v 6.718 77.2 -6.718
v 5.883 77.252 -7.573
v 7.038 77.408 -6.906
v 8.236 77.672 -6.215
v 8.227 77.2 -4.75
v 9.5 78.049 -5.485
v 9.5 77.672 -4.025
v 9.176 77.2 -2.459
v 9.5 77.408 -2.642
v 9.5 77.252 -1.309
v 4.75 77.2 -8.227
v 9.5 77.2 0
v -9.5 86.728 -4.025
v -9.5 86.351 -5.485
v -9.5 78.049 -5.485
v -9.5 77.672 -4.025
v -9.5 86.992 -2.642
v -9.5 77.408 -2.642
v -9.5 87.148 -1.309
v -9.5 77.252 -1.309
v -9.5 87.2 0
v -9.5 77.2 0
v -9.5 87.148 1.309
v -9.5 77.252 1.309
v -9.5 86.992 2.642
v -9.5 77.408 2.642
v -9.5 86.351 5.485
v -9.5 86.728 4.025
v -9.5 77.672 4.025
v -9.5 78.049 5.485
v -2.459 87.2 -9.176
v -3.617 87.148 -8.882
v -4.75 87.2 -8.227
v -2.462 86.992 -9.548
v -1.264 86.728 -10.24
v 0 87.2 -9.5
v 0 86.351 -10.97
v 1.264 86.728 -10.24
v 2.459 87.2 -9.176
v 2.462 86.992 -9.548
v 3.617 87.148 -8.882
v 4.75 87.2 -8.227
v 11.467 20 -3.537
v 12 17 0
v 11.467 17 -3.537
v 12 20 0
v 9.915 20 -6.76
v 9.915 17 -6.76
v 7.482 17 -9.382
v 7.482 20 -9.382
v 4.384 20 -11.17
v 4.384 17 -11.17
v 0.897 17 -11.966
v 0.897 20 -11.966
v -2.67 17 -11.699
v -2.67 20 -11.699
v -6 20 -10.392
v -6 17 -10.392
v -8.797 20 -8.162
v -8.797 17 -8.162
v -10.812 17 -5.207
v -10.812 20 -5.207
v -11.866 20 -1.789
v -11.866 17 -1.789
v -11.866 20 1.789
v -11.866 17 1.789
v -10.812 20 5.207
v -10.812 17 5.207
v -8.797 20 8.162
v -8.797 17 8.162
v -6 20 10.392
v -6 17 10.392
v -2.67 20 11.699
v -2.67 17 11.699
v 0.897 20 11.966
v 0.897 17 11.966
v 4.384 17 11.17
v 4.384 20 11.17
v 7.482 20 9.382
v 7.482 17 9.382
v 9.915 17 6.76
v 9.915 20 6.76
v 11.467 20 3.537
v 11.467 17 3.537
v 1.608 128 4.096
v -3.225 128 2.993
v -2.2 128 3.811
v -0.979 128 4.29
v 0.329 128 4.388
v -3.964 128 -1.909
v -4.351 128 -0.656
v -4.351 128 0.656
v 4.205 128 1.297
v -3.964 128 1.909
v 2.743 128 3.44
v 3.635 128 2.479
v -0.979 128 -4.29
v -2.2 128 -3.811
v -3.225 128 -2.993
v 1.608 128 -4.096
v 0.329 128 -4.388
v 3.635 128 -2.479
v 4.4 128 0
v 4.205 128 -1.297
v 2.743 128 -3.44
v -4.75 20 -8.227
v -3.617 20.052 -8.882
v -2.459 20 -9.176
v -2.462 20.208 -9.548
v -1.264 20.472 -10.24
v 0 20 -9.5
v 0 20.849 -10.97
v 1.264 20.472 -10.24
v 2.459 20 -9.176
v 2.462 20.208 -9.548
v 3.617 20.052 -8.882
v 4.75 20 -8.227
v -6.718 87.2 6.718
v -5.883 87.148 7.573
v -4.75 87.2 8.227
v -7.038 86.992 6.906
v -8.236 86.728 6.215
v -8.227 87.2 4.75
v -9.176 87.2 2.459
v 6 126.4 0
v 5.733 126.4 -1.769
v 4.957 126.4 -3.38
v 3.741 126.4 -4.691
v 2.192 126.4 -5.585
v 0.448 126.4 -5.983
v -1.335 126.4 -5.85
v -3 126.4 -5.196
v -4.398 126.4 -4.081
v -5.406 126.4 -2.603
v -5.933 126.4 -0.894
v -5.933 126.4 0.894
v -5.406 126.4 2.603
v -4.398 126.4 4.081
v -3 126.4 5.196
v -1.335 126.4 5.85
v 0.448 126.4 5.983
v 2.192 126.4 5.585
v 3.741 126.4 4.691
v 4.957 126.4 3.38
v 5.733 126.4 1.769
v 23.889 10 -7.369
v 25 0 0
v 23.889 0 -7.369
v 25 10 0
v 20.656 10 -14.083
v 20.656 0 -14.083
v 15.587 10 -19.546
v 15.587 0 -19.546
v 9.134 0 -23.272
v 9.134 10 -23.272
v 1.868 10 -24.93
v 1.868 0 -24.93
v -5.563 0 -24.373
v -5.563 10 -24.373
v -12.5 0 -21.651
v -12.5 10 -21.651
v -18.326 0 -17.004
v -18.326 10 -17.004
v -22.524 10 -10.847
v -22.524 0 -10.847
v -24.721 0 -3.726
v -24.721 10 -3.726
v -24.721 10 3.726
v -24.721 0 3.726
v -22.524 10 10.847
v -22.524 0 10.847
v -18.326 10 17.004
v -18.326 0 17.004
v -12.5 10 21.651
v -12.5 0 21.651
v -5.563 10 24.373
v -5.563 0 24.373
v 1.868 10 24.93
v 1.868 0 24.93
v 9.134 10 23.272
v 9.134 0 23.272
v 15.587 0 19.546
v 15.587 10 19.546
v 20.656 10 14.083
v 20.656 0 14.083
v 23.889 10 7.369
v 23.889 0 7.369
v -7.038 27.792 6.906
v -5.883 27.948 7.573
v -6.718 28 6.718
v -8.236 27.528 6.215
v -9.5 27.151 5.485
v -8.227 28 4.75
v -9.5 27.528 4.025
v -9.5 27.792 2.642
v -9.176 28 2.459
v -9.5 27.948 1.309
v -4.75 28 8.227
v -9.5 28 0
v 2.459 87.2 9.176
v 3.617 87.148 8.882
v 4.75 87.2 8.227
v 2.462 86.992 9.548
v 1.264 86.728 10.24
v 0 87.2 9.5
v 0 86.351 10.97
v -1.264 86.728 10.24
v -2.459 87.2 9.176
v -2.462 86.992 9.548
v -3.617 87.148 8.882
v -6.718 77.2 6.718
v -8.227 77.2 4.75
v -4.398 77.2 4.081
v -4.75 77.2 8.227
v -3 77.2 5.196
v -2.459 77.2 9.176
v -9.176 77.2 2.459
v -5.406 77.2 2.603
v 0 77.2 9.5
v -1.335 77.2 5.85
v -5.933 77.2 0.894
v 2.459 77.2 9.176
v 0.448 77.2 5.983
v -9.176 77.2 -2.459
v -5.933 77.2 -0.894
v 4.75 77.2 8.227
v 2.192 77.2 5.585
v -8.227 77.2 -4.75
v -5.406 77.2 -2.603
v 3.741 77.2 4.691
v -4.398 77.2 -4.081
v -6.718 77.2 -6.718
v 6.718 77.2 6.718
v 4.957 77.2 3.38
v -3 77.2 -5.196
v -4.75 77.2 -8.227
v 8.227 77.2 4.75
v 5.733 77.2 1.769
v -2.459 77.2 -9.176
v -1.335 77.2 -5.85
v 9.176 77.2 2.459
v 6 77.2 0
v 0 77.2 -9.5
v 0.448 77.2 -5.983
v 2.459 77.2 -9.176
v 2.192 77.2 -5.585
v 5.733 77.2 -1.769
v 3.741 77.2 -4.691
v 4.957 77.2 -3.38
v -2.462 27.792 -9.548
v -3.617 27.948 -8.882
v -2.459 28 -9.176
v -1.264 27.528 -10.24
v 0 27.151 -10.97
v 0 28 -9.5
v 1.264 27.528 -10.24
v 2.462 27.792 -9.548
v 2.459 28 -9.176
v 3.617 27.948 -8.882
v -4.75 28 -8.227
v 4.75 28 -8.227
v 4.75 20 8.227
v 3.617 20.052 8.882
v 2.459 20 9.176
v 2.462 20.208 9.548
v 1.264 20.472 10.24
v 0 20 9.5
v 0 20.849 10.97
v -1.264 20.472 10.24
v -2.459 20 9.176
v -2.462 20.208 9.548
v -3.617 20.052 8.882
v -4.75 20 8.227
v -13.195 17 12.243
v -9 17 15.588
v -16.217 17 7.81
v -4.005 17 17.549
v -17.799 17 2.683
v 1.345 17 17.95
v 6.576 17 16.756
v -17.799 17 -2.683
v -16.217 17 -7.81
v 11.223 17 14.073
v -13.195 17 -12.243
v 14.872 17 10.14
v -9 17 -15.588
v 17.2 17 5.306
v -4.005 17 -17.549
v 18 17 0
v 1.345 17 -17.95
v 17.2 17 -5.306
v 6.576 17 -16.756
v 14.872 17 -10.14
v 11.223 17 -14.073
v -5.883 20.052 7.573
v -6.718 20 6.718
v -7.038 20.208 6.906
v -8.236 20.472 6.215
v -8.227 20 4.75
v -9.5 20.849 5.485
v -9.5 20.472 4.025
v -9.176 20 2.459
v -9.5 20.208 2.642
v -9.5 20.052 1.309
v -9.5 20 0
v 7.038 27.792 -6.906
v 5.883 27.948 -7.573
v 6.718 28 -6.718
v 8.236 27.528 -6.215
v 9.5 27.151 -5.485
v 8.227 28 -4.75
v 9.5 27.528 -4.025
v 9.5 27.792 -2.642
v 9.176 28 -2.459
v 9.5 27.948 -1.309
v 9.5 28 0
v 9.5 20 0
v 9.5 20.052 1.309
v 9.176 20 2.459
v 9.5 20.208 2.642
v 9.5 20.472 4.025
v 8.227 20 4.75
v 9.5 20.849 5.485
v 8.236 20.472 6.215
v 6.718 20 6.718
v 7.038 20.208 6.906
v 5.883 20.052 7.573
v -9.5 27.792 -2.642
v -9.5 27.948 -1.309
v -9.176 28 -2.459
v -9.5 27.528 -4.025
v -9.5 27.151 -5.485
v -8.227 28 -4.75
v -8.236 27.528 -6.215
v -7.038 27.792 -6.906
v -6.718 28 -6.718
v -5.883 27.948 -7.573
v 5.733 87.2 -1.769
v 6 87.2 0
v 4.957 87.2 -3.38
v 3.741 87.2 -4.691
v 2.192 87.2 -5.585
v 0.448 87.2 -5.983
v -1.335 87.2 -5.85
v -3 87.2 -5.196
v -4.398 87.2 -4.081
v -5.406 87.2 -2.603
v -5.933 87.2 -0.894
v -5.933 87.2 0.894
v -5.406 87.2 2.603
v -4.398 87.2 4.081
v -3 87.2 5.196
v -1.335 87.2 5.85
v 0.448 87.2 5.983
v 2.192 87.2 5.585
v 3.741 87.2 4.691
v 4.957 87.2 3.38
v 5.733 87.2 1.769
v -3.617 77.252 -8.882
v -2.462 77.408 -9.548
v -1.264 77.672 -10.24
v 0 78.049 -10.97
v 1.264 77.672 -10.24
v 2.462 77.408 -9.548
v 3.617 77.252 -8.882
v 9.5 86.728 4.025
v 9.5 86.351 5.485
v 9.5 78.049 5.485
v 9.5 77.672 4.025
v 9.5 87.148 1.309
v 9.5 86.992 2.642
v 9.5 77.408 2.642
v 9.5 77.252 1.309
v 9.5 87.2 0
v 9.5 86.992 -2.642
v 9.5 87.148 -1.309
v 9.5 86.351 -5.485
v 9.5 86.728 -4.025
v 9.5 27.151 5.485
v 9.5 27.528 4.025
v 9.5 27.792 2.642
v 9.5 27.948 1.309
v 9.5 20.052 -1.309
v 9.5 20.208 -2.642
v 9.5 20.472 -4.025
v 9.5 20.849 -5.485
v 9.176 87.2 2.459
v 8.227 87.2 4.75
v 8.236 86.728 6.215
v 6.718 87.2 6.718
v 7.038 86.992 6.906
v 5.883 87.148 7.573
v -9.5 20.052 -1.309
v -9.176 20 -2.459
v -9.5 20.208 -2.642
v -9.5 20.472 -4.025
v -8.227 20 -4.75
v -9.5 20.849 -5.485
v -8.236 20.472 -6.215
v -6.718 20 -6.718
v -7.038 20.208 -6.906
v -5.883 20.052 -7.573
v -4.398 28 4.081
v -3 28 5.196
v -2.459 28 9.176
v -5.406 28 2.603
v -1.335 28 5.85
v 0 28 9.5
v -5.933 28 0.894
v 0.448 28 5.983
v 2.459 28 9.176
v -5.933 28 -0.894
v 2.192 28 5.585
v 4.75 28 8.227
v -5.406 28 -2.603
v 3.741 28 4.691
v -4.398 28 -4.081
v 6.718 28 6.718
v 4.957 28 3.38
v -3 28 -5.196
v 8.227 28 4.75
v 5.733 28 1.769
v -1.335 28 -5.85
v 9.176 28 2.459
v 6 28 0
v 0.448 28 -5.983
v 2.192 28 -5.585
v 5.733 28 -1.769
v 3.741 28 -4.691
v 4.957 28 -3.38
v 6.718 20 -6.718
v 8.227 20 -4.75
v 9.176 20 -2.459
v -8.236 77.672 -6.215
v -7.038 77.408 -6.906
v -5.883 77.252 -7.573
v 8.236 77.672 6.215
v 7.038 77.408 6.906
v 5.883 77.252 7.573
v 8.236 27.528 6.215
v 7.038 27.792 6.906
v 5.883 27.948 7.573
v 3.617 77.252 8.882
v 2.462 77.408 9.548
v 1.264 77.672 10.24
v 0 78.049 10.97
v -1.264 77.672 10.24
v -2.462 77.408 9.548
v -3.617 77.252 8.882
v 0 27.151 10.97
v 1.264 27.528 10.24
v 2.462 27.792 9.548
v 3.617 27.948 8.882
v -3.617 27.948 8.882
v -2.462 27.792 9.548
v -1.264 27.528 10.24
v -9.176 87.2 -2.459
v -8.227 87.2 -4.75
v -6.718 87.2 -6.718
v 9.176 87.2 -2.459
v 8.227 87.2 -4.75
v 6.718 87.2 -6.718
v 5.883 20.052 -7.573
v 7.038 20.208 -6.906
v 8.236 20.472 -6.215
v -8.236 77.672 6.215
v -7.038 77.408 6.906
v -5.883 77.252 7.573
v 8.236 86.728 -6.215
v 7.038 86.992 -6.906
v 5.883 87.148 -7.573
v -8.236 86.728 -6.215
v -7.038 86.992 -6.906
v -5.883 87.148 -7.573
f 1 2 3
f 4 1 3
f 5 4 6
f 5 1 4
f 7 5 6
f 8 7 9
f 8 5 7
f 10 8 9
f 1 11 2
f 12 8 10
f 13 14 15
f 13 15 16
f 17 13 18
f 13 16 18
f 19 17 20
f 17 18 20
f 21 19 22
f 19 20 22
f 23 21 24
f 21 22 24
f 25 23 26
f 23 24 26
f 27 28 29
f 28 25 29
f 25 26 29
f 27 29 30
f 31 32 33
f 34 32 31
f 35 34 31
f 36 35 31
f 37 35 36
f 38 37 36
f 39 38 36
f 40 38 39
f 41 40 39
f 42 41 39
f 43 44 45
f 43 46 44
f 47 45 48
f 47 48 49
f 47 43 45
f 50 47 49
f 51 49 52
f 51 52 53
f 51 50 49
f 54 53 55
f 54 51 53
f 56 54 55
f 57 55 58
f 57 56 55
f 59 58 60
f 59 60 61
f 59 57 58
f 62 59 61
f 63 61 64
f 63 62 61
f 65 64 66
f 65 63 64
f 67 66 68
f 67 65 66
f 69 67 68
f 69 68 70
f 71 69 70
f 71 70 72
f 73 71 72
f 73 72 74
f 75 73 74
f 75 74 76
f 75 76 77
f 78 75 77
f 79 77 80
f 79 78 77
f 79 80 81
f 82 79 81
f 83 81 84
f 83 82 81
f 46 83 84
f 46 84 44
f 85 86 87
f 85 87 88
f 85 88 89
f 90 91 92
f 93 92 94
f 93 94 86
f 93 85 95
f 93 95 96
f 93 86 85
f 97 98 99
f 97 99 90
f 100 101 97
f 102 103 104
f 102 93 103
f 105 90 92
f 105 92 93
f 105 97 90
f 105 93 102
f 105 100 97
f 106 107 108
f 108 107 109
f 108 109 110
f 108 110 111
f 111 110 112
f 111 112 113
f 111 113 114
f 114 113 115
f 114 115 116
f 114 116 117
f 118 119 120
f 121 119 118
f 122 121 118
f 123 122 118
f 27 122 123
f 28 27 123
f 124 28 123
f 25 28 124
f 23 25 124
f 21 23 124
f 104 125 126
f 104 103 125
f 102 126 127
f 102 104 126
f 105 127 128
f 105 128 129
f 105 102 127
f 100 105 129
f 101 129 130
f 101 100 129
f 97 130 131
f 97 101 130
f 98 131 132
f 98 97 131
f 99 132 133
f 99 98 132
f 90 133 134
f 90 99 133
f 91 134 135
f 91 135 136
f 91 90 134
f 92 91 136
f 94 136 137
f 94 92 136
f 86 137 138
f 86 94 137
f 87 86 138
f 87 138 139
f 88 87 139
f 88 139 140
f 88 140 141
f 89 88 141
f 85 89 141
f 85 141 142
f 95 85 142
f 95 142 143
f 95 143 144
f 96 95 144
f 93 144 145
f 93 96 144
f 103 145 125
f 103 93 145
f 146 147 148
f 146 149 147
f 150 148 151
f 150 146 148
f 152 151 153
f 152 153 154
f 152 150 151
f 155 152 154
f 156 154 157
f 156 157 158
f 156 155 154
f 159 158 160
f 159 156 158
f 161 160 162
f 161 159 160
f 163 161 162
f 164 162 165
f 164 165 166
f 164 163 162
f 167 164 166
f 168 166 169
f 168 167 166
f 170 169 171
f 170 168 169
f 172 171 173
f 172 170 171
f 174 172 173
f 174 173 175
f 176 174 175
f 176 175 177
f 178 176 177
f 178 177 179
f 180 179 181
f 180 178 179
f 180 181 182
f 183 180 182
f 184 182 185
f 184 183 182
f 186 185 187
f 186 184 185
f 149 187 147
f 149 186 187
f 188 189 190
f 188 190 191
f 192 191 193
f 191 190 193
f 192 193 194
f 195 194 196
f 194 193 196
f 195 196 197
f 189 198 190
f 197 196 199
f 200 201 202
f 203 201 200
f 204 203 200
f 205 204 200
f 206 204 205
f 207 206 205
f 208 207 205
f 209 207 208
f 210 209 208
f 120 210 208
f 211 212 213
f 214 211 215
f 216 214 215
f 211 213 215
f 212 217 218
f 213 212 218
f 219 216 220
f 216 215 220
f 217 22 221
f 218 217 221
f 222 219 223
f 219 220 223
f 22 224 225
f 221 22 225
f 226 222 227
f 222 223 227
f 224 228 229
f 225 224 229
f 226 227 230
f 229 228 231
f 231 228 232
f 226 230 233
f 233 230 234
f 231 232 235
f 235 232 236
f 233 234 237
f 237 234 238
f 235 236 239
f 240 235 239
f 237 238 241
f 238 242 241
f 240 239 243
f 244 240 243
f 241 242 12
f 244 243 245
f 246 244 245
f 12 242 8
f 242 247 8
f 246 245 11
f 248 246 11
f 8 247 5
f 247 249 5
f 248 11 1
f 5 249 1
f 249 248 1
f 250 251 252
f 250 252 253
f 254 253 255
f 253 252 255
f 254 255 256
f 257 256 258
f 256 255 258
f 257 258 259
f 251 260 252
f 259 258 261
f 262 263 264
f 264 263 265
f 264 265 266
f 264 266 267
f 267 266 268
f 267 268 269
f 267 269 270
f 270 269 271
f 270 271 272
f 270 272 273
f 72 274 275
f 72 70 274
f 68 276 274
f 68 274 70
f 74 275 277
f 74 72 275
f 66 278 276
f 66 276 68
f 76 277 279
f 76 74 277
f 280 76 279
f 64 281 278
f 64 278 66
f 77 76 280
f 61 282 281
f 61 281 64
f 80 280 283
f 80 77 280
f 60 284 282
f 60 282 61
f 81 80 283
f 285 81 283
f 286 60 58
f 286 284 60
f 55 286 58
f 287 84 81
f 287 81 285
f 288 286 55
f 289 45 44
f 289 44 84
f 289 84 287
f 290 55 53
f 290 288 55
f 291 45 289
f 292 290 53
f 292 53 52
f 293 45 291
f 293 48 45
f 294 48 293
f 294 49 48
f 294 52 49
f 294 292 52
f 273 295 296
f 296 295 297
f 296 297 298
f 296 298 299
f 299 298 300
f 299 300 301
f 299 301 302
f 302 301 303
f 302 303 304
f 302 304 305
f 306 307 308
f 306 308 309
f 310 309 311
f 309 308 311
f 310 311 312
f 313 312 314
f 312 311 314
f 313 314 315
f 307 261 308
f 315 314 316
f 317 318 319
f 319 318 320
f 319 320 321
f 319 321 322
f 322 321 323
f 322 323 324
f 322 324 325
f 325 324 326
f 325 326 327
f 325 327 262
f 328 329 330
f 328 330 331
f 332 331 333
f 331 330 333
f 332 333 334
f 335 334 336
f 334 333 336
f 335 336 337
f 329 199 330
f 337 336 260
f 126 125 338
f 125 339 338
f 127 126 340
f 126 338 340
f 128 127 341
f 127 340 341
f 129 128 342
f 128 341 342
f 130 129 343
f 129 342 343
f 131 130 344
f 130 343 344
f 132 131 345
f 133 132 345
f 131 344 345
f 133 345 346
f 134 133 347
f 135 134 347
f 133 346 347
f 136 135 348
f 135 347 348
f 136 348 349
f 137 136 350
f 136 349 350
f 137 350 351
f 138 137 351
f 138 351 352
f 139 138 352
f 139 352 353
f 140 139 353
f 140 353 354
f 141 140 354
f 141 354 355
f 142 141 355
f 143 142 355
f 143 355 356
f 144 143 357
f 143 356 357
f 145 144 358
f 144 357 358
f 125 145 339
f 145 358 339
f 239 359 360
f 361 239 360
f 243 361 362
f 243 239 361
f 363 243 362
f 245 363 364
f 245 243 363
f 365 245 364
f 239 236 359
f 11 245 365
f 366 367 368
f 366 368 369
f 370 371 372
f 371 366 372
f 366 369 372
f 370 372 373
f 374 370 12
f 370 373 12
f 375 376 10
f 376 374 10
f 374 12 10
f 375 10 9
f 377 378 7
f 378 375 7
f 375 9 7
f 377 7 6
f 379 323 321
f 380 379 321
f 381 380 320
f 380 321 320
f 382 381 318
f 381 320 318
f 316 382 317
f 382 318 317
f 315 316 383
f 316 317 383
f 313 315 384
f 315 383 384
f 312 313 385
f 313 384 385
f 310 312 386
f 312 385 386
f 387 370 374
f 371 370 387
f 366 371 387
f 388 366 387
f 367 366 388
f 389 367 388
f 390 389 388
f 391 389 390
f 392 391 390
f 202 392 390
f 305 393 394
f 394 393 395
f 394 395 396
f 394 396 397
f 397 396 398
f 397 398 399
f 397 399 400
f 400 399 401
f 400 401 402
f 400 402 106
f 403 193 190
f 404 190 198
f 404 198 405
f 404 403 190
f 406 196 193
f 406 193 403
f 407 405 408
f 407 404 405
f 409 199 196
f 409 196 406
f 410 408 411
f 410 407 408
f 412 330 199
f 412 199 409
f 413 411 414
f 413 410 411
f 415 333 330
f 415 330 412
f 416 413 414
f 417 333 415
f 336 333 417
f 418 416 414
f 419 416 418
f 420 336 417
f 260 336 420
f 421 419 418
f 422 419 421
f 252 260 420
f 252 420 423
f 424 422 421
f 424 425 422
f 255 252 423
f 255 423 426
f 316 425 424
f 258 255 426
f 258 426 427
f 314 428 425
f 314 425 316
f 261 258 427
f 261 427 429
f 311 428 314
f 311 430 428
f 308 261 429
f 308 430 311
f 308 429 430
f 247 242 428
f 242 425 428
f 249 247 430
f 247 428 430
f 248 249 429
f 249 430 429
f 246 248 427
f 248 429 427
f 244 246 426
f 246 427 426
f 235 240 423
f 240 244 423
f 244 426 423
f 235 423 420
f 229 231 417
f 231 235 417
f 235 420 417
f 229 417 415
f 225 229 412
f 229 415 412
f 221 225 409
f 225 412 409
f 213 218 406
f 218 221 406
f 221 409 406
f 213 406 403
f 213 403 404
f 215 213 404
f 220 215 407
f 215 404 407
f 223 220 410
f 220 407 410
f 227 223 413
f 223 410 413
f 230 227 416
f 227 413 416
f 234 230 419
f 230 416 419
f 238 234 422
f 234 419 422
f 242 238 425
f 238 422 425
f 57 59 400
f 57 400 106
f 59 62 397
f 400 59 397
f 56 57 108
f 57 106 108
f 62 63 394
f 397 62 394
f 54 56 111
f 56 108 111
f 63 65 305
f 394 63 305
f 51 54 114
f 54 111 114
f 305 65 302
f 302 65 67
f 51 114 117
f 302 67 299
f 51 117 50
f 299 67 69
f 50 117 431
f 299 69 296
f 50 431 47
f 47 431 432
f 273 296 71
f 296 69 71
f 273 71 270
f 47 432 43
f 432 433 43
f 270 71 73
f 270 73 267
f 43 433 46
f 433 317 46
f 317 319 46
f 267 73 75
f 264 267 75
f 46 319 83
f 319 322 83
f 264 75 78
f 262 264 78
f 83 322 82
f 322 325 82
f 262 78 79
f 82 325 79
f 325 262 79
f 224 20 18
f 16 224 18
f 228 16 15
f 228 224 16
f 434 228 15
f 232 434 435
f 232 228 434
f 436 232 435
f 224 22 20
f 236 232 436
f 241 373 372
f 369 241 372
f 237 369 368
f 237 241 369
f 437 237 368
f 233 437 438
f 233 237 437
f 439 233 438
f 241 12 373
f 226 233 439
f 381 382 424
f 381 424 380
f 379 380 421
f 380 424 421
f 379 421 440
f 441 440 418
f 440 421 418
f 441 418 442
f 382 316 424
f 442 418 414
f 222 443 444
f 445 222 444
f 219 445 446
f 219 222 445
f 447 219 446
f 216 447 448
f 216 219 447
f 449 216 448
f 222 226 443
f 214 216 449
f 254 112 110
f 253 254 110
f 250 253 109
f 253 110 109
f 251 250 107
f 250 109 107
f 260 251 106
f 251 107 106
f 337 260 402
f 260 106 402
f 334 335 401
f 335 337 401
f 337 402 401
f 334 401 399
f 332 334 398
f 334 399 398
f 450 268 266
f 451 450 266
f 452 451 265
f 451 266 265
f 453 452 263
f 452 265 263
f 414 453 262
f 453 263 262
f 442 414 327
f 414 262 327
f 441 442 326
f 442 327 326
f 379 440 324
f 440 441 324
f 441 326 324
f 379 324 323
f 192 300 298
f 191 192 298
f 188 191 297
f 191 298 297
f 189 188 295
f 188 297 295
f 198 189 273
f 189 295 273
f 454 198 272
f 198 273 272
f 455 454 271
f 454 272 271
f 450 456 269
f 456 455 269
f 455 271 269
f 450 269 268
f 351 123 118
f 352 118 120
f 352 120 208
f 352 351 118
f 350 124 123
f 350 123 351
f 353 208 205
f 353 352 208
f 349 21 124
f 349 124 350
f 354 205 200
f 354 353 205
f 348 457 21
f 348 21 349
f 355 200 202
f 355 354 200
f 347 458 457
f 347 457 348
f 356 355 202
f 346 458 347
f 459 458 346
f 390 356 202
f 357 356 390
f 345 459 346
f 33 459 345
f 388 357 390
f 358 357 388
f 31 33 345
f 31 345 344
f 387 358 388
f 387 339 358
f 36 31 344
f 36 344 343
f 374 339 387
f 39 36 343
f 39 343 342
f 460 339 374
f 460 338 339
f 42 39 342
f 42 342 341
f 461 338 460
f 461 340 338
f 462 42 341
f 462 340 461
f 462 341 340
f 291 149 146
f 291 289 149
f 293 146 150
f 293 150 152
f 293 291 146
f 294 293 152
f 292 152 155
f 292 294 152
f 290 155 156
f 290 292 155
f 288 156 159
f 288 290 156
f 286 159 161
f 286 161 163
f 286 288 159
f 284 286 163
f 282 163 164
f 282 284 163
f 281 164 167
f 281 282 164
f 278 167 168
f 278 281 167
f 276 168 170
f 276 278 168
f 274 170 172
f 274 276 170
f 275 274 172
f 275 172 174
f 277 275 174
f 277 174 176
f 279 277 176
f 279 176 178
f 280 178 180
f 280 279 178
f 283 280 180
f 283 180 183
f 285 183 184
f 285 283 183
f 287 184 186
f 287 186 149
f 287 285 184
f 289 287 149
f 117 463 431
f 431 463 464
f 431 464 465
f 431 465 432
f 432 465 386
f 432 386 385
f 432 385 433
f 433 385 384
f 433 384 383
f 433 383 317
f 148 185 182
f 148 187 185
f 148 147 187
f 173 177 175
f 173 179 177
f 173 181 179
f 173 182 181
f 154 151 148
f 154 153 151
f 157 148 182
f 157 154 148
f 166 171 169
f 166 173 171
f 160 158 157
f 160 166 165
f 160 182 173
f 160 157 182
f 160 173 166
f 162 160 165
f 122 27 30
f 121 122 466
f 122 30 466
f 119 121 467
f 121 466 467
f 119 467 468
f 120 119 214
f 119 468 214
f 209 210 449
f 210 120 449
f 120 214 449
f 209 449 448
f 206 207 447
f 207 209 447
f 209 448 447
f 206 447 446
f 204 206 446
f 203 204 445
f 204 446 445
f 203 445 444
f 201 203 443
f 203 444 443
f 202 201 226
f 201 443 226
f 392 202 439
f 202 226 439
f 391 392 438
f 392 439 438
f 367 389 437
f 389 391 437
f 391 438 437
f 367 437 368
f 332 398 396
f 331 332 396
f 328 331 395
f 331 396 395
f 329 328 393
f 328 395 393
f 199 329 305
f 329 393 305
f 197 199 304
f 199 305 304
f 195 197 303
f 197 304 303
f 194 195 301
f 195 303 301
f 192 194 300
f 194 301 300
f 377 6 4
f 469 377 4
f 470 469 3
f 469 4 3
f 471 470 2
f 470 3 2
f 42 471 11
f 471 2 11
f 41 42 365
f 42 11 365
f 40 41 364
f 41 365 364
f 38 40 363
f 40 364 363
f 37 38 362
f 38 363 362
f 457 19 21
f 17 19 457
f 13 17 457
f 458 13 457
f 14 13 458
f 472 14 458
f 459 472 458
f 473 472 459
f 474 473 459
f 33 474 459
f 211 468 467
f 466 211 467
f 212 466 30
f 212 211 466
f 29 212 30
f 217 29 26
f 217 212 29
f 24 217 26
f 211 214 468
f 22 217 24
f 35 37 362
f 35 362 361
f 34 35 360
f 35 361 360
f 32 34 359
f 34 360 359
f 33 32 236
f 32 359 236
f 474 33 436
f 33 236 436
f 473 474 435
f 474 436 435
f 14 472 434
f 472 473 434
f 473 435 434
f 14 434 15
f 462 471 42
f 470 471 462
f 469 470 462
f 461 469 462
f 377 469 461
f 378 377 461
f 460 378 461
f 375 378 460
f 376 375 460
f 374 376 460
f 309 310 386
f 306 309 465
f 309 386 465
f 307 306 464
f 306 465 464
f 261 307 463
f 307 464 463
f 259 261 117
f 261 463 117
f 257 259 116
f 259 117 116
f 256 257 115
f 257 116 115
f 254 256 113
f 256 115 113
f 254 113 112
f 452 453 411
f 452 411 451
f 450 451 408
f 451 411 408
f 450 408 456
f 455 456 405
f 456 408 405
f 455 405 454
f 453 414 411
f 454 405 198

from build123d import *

# Parameters (mm, degrees)
EXTRUDE_1_DEPTH = 8
EXTRUDE_2_DEPTH = 10


with BuildPart() as part:
    # Эскиз1 → Повернуть1 (revolve)
    with BuildSketch(Plane.XY, mode=Mode.PRIVATE) as revolve_1_sk:
        Polygon((0, 0), (-25, 0), (-25, 10), (-18, 17), (-12, 17), (-12, 20), (-6, 20), (-6, 28), (-6, 126.4), (-4.4, 128), (0, 128), align=None)
    revolve(revolve_1_sk.sketch.rotate(Axis((0, 0, 0), (0, 1, 0)), 180), axis=Axis((0, 0, 0), (0, 1, 0)))  # turned: the seam where the file's is

    # Эскиз2 → Бобышка-Вытянуть1 (add)
    with BuildSketch(Plane(origin=(0, 20, 0), x_dir=(1, 0, 0), z_dir=(0, 1, 0))):
        Polygon((0, 10.969655115), (-9.5, 5.484827557), (-9.5, -5.484827557), (0, -10.969655115), (9.5, -5.484827557), (9.5, 5.484827557), align=None)
    extrude(amount=EXTRUDE_1_DEPTH)

    # Эскиз3 → Бобышка-Вытянуть2 (add)
    with BuildSketch(Plane(origin=(0, 77.2, 0), x_dir=(1, 0, 0), z_dir=(0, 1, 0))):
        Polygon((9.5, 5.484827557), (0, 10.969655115), (-9.5, 5.484827557), (-9.5, -5.484827557), (0, -10.969655115), (9.5, -5.484827557), align=None)
    extrude(amount=EXTRUDE_2_DEPTH)

    # Эскиз4 → Вырез-Повернуть2 (revolve, cut)
    with BuildSketch(Plane.XY, mode=Mode.PRIVATE) as cut_revolve_2_sk:
        Polygon((-18.160254038, 87.2), (-9.5, 87.2), (-18.160254038, 82.2), align=None)
        Polygon((-18.160254038, 77.2), (-18.160254038, 82.2), (-9.5, 77.2), align=None)
        Polygon((-16.42820323, 28), (-16.42820323, 24), (-9.5, 28), align=None)
        Polygon((-16.42820323, 24), (-16.42820323, 20), (-9.5, 20), align=None)
    revolve(cut_revolve_2_sk.sketch.rotate(Axis((0, 128, 0), (0, -1, 0)), 180), axis=Axis((0, 128, 0), (0, -1, 0)), mode=Mode.SUBTRACT)  # turned: the seam where the file's is


solid = part.part
